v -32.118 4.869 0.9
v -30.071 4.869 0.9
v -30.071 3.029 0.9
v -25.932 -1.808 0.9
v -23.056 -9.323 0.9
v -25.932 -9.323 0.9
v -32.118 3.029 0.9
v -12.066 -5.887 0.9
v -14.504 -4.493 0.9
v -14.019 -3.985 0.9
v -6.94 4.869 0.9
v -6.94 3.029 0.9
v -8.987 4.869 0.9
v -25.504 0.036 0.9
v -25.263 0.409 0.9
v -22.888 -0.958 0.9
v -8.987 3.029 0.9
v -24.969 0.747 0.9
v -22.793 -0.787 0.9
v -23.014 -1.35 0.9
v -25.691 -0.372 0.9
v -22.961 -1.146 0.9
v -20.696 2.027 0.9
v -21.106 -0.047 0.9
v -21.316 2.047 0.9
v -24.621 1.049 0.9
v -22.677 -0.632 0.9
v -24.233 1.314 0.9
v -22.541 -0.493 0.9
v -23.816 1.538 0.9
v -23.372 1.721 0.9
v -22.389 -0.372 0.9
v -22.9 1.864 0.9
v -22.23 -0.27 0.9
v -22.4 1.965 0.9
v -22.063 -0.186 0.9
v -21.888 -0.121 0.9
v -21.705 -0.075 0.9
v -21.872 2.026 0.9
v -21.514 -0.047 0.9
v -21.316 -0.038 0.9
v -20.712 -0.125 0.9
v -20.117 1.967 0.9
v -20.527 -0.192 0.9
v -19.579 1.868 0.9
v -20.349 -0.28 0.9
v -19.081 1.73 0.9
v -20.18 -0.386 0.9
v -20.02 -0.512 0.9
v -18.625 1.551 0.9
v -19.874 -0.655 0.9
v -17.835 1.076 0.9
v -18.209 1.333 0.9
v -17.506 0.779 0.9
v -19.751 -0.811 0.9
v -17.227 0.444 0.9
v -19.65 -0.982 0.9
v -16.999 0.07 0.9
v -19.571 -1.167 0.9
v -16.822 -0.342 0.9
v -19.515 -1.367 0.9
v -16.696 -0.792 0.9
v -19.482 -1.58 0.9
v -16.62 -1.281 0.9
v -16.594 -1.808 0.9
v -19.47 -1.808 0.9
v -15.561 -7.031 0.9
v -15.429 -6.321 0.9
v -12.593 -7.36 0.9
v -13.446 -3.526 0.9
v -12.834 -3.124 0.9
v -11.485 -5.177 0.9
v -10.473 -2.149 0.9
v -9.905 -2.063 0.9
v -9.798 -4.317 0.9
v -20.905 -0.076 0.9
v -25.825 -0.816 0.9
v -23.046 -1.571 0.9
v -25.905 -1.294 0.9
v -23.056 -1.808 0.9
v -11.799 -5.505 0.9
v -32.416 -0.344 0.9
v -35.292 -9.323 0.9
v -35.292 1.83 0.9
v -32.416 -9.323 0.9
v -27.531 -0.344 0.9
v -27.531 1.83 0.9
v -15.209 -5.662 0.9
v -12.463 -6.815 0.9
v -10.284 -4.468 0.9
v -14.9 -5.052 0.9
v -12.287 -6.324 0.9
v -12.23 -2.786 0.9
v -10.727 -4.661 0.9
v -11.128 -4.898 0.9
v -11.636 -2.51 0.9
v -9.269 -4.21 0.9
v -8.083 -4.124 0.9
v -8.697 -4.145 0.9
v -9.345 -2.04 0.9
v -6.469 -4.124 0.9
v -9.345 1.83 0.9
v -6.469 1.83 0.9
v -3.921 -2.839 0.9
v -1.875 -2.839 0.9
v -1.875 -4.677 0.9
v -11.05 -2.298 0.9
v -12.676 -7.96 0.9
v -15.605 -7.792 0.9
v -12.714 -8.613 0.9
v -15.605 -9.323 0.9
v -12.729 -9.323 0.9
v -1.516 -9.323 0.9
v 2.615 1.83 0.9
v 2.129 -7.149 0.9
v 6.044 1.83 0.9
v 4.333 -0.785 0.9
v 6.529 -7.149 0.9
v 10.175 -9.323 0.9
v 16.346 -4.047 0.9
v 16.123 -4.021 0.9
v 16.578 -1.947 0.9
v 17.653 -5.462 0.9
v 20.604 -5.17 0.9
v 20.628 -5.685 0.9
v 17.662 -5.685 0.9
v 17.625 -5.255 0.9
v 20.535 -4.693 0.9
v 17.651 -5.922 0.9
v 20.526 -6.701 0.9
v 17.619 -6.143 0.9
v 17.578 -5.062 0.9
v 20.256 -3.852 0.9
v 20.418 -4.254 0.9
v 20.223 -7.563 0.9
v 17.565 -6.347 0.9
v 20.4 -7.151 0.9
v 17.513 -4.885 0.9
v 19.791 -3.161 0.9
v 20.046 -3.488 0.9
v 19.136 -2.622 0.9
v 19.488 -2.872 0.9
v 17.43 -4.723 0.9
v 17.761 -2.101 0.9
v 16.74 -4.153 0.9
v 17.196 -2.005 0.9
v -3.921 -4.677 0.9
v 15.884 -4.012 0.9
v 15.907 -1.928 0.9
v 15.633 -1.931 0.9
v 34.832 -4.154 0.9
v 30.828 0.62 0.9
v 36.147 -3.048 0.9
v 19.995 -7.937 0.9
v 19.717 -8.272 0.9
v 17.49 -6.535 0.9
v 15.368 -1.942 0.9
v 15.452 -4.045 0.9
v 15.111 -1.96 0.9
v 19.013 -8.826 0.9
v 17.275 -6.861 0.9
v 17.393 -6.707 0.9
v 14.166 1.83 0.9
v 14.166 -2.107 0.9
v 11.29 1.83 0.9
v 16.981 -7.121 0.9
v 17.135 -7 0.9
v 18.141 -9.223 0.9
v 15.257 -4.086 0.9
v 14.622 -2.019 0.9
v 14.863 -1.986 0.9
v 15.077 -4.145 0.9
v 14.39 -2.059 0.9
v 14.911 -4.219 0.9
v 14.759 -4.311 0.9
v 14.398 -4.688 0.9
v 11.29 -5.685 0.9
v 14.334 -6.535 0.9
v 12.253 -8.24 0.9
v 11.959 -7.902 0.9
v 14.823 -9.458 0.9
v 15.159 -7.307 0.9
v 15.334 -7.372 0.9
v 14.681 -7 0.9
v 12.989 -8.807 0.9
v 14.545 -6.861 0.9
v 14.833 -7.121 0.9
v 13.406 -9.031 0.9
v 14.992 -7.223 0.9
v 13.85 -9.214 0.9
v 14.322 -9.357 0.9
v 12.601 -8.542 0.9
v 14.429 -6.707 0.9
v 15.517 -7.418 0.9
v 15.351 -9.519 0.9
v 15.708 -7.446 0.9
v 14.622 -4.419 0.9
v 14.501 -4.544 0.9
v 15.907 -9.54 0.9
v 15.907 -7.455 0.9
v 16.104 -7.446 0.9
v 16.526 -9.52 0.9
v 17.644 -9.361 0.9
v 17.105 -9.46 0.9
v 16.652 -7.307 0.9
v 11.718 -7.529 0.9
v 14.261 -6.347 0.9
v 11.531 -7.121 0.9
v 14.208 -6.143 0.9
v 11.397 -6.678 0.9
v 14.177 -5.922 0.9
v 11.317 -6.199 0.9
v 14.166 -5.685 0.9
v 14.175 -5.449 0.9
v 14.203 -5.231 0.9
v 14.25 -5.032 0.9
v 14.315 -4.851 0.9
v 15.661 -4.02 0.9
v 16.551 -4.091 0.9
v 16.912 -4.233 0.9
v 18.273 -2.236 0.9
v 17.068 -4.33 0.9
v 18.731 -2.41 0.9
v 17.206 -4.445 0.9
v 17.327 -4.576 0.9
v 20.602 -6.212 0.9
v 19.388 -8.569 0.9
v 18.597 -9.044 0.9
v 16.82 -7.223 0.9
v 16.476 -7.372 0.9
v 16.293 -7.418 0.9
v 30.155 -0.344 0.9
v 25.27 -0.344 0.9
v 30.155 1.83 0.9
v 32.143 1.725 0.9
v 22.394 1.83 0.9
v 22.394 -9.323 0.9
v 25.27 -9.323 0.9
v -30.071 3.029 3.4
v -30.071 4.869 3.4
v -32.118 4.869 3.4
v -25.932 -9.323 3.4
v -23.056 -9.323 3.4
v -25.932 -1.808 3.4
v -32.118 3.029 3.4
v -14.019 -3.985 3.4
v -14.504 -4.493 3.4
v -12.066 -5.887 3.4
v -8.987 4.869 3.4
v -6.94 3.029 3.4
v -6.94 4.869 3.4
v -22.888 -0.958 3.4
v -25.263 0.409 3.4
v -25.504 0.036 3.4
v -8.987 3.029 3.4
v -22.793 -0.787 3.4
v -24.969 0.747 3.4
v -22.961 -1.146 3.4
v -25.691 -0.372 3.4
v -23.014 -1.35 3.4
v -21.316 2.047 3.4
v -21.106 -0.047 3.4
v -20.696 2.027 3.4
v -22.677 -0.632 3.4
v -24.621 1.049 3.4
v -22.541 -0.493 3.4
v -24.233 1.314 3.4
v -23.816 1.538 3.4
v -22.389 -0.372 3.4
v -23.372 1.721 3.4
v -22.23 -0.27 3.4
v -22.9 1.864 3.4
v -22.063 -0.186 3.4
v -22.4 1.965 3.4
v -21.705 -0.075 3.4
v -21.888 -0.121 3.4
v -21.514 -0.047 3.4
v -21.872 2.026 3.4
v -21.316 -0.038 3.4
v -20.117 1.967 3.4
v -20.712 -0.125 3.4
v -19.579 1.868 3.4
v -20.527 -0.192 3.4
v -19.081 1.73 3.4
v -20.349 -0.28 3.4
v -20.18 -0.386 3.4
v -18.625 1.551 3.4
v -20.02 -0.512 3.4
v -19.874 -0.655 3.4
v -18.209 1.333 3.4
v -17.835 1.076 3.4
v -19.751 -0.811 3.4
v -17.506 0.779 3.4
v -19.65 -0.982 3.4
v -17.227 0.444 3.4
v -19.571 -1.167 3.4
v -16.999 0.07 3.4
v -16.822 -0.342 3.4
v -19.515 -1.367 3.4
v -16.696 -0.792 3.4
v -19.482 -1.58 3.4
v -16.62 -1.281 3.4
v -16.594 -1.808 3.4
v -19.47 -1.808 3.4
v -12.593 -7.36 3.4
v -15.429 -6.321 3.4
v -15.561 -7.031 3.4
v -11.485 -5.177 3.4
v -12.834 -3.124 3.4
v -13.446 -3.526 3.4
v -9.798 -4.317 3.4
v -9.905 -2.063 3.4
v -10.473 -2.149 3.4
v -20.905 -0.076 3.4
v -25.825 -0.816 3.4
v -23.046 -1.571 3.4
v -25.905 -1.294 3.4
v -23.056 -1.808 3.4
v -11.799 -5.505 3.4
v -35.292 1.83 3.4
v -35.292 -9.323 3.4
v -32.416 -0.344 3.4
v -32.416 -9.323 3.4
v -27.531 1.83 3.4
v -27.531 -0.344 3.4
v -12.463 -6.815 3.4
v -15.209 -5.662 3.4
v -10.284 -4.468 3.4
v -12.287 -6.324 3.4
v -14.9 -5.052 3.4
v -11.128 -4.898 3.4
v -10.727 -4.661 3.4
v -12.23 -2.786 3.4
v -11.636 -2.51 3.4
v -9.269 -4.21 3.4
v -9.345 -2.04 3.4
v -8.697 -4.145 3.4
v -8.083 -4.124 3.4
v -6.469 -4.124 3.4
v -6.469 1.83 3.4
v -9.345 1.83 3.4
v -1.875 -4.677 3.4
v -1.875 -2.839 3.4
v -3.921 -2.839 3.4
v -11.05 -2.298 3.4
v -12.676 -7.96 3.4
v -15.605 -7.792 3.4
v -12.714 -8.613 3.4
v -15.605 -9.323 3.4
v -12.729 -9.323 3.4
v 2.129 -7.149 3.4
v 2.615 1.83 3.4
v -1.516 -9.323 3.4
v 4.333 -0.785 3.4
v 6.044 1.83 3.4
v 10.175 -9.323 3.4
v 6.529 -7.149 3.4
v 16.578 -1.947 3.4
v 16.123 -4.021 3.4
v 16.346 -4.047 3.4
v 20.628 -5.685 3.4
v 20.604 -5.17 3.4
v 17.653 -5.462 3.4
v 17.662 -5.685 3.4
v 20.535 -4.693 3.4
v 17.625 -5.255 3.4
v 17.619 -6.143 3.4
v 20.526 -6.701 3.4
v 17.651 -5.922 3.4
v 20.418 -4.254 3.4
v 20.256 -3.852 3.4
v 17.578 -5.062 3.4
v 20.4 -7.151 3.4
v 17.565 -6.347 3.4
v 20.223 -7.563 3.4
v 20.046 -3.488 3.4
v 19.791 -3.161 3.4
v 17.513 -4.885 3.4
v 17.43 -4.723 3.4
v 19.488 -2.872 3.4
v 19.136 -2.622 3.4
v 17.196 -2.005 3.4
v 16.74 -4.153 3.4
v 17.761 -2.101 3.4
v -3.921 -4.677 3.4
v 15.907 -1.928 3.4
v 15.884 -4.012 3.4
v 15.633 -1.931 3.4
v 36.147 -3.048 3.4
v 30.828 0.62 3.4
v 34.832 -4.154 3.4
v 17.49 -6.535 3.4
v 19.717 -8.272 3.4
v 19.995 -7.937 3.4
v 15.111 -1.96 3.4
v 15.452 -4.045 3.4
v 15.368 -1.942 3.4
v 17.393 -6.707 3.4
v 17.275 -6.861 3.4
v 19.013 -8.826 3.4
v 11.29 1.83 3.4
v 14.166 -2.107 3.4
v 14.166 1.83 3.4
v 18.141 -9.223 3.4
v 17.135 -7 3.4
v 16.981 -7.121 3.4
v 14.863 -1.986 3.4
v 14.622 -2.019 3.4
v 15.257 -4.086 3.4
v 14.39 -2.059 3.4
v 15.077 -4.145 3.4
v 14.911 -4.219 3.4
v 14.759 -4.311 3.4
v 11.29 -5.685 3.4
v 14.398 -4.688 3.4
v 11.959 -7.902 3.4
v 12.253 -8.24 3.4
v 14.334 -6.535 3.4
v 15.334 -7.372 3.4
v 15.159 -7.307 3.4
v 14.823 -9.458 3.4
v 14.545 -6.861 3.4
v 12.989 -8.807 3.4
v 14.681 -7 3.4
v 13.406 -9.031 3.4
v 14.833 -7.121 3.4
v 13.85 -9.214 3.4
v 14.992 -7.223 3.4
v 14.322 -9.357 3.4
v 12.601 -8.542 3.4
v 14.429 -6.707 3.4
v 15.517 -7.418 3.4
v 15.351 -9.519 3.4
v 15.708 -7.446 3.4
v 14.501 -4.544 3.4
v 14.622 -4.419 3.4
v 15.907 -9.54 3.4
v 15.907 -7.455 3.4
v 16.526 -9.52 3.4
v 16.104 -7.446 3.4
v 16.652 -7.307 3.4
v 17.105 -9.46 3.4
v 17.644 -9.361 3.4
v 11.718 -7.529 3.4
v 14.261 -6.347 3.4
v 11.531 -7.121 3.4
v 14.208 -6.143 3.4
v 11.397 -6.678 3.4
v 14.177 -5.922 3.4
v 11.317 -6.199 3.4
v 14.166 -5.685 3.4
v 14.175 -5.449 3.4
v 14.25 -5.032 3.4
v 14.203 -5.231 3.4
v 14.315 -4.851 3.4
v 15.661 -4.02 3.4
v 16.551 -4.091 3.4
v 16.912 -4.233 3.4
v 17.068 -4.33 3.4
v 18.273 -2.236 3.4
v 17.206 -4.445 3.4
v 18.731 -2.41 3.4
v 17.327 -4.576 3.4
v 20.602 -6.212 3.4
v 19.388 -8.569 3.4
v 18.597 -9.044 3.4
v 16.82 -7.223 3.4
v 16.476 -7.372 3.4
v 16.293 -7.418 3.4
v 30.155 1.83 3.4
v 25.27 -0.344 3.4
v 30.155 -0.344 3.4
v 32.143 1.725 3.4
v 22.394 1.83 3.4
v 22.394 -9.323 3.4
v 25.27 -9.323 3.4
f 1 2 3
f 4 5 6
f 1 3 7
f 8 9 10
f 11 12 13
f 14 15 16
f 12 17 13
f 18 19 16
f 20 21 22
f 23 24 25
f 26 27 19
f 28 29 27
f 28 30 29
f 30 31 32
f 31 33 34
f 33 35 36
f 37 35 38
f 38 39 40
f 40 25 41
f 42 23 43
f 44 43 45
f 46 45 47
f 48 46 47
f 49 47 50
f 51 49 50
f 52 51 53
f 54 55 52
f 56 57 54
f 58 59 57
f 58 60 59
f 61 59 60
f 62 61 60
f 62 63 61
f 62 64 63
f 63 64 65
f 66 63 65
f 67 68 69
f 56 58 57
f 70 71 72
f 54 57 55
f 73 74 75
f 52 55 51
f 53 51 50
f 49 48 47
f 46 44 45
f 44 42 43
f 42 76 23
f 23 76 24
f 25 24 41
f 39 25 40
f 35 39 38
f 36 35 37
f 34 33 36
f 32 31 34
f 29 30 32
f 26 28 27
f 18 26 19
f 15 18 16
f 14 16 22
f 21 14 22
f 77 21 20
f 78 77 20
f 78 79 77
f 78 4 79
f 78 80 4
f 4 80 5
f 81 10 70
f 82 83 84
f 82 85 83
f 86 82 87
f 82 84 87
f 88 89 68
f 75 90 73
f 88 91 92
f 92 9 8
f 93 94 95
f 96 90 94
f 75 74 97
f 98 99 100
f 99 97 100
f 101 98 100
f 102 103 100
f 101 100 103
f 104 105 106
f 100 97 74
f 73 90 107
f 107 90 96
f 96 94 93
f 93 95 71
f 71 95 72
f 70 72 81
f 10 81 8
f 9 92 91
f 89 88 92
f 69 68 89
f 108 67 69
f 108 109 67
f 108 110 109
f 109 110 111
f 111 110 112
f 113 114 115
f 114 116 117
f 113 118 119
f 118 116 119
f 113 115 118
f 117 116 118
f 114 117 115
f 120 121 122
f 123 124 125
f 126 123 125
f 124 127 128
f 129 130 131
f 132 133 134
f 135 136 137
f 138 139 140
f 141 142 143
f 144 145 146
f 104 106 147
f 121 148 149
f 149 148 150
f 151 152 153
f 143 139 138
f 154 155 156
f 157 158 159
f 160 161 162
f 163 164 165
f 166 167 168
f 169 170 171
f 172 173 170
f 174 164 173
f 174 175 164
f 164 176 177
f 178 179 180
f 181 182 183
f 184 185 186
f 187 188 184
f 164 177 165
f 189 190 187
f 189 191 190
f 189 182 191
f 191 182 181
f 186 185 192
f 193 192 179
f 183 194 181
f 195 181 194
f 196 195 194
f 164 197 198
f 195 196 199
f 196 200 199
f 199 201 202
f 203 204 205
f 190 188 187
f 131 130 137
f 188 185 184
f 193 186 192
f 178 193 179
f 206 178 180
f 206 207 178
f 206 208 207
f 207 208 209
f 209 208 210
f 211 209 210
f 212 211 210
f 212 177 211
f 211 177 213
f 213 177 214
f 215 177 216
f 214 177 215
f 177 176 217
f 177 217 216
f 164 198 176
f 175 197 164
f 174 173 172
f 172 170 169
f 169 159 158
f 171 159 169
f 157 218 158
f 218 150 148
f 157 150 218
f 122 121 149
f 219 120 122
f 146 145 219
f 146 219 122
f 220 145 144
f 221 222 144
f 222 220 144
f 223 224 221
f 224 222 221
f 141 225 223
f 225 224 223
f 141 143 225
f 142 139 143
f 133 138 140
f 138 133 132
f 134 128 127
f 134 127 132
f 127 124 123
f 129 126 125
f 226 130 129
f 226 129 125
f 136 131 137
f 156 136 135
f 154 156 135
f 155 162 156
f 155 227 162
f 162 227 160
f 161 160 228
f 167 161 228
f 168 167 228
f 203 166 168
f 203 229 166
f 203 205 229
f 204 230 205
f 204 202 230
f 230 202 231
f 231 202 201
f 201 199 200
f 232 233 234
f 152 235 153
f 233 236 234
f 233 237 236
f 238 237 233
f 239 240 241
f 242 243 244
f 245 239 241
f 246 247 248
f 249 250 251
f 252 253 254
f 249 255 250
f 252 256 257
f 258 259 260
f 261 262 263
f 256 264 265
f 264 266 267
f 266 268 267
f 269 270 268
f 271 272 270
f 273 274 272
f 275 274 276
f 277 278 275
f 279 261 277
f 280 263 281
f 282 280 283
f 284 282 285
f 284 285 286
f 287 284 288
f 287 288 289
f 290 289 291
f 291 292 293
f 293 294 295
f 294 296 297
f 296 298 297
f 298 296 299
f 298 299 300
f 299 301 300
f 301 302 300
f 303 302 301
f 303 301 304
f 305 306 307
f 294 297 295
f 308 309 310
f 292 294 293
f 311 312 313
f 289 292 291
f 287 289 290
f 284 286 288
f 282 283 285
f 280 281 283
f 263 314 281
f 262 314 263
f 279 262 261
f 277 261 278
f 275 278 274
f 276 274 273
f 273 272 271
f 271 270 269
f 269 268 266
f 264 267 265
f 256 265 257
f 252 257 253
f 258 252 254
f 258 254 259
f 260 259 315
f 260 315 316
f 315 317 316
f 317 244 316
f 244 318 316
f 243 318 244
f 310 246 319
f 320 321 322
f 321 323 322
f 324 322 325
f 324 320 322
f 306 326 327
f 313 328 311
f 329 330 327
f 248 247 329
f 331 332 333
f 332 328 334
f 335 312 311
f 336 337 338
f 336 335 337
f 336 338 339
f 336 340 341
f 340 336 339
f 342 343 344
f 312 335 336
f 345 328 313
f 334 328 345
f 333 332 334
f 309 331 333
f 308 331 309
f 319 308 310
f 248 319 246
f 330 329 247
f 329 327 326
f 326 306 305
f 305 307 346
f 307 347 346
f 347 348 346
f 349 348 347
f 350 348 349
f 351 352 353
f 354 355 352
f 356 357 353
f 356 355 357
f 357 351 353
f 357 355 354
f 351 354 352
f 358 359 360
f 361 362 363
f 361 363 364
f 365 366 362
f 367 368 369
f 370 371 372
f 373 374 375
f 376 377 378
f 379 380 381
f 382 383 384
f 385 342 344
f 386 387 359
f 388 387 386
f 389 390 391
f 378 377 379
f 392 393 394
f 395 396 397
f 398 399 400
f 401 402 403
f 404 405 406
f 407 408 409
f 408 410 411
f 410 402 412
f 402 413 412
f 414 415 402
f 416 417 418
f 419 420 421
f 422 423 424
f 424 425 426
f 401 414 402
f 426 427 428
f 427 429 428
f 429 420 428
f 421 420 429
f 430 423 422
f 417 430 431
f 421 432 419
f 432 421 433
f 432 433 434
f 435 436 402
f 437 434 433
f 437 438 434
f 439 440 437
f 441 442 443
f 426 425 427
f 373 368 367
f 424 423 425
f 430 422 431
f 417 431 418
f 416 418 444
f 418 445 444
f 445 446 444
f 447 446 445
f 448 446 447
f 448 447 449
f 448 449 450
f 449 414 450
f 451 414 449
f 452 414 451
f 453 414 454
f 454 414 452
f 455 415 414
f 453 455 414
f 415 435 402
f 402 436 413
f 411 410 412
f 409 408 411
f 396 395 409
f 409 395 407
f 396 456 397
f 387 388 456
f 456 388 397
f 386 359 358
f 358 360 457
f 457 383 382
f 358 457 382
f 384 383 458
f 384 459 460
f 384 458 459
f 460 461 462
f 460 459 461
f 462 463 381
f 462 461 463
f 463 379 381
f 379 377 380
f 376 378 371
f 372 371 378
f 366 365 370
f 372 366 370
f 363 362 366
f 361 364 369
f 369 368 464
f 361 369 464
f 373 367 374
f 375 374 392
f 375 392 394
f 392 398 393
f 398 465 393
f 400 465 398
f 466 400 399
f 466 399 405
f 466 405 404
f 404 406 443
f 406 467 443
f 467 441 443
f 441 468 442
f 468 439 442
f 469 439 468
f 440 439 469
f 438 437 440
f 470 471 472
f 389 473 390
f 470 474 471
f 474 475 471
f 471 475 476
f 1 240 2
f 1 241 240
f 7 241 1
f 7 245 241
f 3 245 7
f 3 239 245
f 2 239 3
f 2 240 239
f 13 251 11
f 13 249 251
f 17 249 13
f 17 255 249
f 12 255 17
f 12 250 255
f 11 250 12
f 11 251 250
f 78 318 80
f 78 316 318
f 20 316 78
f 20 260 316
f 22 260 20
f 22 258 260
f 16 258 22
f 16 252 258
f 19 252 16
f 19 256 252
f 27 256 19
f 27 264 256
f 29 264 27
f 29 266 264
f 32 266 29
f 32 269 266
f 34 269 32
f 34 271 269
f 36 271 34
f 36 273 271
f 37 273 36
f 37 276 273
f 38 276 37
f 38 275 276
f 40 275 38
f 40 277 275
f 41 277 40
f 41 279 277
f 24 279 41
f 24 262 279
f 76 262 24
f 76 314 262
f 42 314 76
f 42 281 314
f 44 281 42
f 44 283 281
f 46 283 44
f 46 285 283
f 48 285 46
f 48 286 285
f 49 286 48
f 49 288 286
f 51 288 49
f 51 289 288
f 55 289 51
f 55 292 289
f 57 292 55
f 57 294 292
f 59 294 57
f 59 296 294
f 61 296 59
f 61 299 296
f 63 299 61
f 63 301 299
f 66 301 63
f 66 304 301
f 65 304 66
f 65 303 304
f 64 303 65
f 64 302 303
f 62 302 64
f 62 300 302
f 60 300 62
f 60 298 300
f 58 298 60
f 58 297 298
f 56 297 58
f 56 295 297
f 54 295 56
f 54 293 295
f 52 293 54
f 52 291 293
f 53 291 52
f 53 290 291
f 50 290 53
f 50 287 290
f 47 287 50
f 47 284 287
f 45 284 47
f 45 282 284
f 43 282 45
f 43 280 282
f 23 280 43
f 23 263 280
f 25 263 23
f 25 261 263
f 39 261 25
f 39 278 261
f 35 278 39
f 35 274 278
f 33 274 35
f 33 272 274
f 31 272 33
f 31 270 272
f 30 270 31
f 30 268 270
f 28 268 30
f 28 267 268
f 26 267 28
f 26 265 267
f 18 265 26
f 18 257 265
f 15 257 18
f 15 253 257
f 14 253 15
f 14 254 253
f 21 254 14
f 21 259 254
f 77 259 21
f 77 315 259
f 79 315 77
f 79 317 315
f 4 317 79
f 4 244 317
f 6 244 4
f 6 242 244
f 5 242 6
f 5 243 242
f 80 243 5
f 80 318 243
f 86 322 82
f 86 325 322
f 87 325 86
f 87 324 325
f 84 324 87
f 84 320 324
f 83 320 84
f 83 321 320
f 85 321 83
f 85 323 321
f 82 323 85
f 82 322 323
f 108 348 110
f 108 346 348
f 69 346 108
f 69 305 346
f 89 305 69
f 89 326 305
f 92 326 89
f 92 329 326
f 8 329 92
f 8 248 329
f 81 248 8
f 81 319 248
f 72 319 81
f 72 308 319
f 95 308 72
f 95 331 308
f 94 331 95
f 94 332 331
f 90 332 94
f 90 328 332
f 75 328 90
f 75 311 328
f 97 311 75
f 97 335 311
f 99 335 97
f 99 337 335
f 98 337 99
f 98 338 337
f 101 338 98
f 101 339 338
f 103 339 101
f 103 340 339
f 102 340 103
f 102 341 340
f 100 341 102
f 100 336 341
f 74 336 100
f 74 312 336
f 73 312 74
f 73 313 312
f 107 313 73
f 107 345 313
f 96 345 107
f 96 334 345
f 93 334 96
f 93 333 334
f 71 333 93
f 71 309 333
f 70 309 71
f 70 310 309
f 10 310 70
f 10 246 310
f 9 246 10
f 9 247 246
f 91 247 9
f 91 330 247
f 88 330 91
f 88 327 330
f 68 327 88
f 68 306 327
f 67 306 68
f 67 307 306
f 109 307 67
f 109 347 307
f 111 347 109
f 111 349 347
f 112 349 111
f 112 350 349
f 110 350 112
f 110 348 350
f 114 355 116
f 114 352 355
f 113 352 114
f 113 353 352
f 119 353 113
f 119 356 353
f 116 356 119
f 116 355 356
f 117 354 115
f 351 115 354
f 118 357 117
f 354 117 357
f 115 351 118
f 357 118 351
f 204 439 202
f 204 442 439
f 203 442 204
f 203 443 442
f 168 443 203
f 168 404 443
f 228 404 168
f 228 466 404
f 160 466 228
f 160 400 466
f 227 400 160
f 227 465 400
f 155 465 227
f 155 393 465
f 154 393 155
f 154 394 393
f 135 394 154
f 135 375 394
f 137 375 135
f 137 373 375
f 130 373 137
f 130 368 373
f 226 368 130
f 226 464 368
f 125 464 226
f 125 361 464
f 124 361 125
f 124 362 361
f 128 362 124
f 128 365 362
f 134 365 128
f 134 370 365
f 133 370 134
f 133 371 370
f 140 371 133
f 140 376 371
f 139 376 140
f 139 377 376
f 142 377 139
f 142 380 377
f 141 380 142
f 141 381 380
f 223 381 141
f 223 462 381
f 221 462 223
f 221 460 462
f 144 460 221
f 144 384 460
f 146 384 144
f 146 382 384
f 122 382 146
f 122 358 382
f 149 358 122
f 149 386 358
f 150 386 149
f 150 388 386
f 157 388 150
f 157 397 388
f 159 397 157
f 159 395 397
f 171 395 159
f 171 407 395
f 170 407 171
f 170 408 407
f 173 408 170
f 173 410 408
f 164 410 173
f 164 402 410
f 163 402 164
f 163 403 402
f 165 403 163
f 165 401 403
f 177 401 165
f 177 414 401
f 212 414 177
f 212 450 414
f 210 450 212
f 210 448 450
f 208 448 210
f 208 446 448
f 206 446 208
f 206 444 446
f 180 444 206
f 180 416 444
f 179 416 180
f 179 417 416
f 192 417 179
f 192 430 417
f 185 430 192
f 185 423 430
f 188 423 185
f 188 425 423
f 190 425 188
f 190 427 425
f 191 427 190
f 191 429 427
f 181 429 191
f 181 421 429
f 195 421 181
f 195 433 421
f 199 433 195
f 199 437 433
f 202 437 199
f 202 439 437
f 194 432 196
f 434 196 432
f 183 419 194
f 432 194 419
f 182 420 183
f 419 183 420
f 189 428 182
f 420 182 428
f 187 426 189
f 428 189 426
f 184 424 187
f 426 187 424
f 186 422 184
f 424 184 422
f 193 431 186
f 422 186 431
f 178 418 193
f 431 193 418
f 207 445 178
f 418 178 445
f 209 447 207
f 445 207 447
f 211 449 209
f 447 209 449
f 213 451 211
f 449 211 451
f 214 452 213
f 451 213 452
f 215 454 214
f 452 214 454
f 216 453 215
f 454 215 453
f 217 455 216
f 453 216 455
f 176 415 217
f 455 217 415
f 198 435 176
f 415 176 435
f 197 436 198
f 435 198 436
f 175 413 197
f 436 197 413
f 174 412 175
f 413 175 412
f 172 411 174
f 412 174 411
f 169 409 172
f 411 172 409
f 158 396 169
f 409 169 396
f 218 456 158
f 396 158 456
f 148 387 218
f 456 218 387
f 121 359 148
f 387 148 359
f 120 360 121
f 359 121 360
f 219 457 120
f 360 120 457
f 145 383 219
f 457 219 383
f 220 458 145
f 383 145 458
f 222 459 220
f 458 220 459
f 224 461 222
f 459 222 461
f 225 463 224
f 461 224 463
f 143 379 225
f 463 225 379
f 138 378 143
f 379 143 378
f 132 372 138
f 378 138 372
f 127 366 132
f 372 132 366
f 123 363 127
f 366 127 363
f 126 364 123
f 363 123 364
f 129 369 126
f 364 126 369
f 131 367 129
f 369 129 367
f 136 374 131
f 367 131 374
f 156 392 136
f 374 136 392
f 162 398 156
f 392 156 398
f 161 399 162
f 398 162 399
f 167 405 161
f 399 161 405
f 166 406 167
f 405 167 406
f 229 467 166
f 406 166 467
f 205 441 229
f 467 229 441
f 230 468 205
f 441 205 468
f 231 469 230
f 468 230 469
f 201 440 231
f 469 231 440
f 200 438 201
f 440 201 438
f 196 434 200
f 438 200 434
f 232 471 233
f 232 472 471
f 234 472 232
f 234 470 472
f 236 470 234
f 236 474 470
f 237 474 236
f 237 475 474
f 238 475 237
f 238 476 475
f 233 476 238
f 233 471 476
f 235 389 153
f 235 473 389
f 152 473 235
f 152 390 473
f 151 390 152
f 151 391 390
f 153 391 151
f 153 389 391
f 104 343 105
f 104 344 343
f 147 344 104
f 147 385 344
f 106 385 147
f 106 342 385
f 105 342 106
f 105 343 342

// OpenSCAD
$fn = 48;
  // syllabics (overlaid on icon, tallest)
  translate([0, -2.500, 0.900]) linear_extrude(height=2.500) text("ᒦᒋᓲᐎᑲᒥᐠ", size=11.016, halign="center", valign="center", font="Euphemia UCAS:style=Bold");
